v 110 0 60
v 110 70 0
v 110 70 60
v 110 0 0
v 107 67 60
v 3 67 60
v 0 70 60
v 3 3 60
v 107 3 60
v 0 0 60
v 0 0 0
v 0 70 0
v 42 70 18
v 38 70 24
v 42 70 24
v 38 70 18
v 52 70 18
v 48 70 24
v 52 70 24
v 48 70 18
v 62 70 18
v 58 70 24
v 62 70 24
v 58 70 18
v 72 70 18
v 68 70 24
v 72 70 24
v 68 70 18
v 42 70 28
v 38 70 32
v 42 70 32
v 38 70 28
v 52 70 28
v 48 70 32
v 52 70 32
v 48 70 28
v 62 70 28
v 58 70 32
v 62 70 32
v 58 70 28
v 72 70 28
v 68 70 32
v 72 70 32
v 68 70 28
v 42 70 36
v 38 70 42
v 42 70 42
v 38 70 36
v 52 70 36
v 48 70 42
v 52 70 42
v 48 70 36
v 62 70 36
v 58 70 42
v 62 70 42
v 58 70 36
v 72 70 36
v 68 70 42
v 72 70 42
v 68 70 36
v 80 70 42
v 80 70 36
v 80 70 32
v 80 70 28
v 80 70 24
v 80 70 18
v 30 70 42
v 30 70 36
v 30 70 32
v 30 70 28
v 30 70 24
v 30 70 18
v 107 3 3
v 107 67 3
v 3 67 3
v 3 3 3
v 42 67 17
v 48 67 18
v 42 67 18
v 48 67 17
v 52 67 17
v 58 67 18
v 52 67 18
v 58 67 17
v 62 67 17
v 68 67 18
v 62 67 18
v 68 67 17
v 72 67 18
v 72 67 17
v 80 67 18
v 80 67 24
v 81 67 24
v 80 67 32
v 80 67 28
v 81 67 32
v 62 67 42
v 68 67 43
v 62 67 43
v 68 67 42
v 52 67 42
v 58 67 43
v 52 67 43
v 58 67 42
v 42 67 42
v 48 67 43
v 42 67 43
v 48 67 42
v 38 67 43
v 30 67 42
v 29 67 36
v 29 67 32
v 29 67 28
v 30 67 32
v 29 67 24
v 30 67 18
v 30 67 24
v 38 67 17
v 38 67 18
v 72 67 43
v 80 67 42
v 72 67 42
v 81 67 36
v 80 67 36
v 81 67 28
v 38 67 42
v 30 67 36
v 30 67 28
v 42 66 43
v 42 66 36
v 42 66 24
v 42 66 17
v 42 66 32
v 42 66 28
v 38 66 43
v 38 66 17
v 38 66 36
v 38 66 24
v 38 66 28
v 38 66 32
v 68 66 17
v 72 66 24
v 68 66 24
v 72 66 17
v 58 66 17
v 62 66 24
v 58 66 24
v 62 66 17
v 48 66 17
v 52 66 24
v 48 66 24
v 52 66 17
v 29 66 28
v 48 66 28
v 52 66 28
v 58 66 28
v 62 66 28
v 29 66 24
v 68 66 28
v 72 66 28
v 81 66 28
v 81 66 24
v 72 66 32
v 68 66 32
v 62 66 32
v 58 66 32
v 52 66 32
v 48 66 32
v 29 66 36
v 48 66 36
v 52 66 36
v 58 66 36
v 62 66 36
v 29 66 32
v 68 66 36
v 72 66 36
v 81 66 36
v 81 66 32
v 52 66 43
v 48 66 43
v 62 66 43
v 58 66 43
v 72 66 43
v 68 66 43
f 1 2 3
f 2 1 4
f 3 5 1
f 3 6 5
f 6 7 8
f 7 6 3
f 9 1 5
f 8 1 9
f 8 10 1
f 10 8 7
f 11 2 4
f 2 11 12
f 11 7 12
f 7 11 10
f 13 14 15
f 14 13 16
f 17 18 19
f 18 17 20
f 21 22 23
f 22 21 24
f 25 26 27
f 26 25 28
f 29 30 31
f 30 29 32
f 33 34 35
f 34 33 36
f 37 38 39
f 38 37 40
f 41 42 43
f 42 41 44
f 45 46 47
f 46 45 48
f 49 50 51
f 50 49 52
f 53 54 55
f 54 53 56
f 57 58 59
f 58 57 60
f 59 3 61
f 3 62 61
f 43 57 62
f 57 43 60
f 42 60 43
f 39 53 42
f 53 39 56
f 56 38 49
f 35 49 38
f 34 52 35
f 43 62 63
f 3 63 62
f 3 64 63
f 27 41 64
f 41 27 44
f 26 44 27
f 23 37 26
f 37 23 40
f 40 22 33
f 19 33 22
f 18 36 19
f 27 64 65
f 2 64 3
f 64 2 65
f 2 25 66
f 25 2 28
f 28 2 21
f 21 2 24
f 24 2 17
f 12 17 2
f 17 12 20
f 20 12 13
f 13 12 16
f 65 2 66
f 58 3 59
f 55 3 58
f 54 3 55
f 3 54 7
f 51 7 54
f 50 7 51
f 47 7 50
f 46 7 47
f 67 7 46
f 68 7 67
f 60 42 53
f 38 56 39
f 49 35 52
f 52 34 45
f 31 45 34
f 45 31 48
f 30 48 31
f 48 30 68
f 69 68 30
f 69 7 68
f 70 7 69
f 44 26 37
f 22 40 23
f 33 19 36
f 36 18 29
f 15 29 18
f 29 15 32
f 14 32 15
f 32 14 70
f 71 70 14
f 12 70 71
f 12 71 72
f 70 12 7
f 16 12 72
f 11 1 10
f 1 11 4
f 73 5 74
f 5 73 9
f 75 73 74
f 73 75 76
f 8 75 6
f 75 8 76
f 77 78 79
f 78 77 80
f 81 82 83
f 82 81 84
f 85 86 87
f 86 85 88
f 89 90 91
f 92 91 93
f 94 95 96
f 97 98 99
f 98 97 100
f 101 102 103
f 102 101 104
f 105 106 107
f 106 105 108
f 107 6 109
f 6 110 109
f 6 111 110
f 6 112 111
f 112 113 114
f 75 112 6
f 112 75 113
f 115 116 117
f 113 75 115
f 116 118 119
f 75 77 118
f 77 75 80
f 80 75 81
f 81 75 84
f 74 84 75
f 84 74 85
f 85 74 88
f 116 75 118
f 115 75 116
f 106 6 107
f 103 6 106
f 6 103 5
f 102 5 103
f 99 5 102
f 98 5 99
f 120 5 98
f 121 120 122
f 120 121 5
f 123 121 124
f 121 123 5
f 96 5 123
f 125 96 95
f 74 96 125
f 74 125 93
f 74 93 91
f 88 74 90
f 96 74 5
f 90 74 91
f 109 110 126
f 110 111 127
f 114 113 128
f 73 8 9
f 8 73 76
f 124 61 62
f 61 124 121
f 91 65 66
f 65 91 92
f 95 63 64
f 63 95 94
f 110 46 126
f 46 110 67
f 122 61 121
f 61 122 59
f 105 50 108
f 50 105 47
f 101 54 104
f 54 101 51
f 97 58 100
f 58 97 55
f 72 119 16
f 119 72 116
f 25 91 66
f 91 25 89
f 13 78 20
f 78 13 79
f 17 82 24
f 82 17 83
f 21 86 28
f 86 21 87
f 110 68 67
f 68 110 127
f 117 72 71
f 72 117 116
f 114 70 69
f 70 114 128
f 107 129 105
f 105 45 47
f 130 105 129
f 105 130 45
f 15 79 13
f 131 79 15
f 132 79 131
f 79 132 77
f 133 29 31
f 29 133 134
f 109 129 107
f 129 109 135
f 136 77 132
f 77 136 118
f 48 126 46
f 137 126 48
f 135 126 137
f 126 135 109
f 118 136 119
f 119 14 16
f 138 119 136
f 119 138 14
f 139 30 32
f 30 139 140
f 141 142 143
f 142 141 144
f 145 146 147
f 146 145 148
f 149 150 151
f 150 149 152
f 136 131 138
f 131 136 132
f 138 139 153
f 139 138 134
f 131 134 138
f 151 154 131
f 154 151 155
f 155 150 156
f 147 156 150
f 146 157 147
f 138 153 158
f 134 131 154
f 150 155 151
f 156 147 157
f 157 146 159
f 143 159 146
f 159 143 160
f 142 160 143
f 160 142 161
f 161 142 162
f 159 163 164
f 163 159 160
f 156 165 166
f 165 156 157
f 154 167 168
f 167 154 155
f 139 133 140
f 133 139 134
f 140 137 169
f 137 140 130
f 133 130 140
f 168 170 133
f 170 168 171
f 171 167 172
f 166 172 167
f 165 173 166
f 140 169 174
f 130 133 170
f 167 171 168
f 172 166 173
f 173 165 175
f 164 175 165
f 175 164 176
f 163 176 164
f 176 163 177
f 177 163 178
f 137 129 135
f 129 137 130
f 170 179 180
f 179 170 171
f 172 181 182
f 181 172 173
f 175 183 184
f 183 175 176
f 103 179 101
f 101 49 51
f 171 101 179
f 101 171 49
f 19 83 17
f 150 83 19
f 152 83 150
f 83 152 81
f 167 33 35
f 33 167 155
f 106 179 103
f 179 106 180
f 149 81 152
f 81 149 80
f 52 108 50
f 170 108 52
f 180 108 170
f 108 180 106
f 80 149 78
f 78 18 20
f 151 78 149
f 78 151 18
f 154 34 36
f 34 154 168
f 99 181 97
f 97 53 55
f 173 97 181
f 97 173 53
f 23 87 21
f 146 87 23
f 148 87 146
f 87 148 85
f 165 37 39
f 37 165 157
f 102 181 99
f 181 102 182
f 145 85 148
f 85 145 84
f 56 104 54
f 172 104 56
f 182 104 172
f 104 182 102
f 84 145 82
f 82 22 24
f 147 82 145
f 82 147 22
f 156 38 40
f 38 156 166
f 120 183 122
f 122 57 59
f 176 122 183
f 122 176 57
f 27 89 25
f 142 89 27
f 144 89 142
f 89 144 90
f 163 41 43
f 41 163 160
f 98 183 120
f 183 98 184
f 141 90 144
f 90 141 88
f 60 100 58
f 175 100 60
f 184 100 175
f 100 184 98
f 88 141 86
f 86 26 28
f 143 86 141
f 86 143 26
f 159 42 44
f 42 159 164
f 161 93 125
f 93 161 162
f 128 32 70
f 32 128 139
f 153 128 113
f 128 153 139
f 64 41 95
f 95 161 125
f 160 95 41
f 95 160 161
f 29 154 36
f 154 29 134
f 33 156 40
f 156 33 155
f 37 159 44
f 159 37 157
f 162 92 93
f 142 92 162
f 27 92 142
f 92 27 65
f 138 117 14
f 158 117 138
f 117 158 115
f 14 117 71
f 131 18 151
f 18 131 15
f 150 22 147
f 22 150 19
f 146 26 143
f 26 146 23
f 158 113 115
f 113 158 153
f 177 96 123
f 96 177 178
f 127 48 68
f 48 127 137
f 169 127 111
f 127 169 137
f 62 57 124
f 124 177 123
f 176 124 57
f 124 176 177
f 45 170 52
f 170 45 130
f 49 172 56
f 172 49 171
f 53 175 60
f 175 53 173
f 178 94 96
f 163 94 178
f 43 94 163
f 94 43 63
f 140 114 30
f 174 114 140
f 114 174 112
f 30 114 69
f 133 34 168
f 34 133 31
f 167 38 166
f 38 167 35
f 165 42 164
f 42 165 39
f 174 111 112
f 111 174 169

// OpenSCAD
$fn = 32;

// ----------------------------------------------------------------------
// Vent box: crossgrid enclosure
// ----------------------------------------------------------------------

// --- parameters (mm) ---
box_l = 110;              // box length, X
box_w = 70;               // box width, Y
box_h = 60;               // box height, Z
wall_t = 3;               // shell wall thickness
win_l = 50;               // vent window width, X
win_h = 24;               // vent window height, Z
bar_w = 4;                // grid bar width
n_v = 4;                  // vertical bar count
n_h = 2;                  // horizontal bar count

win_z0 = (box_h - win_h) / 2;  // window lower edge Z
v_step = win_l / (n_v + 1);  // vertical bar step
h_step = win_h / (n_h + 1);  // horizontal bar step

difference() {
  union() {
    difference() {
      cube([box_l, box_w, box_h]);
  translate([wall_t, wall_t, wall_t])
    cube([box_l - 2 * wall_t, box_w - 2 * wall_t, box_h]);
  translate([(box_l - win_l) / 2, box_w - wall_t - 1, win_z0])
    cube([win_l, wall_t + 2, win_h]);
    }
    for (i = [1 : n_v])
      translate([(box_l - win_l) / 2 + i * v_step - bar_w / 2,
                 box_w - wall_t - 1, win_z0 - 1])
        cube([bar_w, wall_t + 1, win_h + 2]);
    for (i = [1 : n_h])
      translate([(box_l - win_l) / 2 - 1, box_w - wall_t - 1,
                 win_z0 + i * h_step - bar_w / 2])
        cube([win_l + 2, wall_t + 1, bar_w]);
  }
}
